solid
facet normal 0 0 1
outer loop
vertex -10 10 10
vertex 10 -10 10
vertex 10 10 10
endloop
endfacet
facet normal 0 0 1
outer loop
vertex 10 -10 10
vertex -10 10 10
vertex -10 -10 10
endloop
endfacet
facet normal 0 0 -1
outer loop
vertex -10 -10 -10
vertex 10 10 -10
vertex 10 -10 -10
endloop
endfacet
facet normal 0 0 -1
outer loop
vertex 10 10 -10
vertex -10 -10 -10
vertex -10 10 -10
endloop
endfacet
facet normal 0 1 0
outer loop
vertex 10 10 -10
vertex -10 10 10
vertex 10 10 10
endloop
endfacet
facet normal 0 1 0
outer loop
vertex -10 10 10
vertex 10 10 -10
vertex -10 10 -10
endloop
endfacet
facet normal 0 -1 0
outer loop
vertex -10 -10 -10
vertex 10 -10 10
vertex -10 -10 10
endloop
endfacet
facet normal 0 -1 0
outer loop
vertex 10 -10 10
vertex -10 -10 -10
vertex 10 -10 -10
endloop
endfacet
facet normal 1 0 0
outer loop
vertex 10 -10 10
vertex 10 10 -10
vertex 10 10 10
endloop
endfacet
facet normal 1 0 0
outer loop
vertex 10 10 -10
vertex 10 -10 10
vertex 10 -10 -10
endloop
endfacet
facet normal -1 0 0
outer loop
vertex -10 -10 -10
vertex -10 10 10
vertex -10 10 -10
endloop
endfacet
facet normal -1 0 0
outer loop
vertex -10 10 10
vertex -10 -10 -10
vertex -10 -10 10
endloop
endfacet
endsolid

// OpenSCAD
// Cube
// (C) @oblomobka - 2023.05
// GPL license

/* **CUSTOMIZER VARIABLES** */
// Edge
edge=20; //[10:100]
// Center of the solid or stand over a face
position = "Center"; //["Center", "Face"]

/* **MODULES** */
module Cube(edge=20, position="Face"){
    
    // Invariants
    diAngleCube = 90; // dihedral angle of cube
    
    // Relations
    rCirCube = sqrt(3)/2; // radius of a circumscribed sphere for edge = 1 / = 1,061...
    rInsCube = 1/2; // radius of a inscribed sphere for edge = 1 / = 0,5
    rMidCube = 1/sqrt(2); // Midradius, which touches the middle of each edge / =0,707...
    
    // Variables
    a = edge/2;
    
    // Definition of points and faces V = 8 / F = 6
    Cpoints = [
        [+a, +a, +a], [-a, +a, +a], [+a, -a, +a], [-a, -a, +a],     // UP       [  0,  1,  2,  3]
        [+a, +a, -a], [-a, +a, -a], [+a, -a, -a], [-a, -a, -a],     // DOWN     [  4,  5,  6,  7]
        ];
    
    Cfaces = [
        [ 0, 2, 3, 1], [ 4, 5, 7, 6],       // XY
        [ 0, 1, 5, 4], [ 2, 6, 7, 3],       // XZ
        [ 0, 4, 6, 2], [ 1, 3, 7, 5]        // YZ
        ];
    
    // Polyhedron stands on xy plane centered on the center of the face or centered on the center of polyhedron
    if(position == "Face"){
        translate([ 0, 0, a])
            polyhedron( Cpoints, Cfaces);}
    else if(position == "Center") {
        polyhedron(Cpoints, Cfaces);} 
}


/* **RENDERING OF SOLIDS** */ 
Cube(edge=edge, position=position);
